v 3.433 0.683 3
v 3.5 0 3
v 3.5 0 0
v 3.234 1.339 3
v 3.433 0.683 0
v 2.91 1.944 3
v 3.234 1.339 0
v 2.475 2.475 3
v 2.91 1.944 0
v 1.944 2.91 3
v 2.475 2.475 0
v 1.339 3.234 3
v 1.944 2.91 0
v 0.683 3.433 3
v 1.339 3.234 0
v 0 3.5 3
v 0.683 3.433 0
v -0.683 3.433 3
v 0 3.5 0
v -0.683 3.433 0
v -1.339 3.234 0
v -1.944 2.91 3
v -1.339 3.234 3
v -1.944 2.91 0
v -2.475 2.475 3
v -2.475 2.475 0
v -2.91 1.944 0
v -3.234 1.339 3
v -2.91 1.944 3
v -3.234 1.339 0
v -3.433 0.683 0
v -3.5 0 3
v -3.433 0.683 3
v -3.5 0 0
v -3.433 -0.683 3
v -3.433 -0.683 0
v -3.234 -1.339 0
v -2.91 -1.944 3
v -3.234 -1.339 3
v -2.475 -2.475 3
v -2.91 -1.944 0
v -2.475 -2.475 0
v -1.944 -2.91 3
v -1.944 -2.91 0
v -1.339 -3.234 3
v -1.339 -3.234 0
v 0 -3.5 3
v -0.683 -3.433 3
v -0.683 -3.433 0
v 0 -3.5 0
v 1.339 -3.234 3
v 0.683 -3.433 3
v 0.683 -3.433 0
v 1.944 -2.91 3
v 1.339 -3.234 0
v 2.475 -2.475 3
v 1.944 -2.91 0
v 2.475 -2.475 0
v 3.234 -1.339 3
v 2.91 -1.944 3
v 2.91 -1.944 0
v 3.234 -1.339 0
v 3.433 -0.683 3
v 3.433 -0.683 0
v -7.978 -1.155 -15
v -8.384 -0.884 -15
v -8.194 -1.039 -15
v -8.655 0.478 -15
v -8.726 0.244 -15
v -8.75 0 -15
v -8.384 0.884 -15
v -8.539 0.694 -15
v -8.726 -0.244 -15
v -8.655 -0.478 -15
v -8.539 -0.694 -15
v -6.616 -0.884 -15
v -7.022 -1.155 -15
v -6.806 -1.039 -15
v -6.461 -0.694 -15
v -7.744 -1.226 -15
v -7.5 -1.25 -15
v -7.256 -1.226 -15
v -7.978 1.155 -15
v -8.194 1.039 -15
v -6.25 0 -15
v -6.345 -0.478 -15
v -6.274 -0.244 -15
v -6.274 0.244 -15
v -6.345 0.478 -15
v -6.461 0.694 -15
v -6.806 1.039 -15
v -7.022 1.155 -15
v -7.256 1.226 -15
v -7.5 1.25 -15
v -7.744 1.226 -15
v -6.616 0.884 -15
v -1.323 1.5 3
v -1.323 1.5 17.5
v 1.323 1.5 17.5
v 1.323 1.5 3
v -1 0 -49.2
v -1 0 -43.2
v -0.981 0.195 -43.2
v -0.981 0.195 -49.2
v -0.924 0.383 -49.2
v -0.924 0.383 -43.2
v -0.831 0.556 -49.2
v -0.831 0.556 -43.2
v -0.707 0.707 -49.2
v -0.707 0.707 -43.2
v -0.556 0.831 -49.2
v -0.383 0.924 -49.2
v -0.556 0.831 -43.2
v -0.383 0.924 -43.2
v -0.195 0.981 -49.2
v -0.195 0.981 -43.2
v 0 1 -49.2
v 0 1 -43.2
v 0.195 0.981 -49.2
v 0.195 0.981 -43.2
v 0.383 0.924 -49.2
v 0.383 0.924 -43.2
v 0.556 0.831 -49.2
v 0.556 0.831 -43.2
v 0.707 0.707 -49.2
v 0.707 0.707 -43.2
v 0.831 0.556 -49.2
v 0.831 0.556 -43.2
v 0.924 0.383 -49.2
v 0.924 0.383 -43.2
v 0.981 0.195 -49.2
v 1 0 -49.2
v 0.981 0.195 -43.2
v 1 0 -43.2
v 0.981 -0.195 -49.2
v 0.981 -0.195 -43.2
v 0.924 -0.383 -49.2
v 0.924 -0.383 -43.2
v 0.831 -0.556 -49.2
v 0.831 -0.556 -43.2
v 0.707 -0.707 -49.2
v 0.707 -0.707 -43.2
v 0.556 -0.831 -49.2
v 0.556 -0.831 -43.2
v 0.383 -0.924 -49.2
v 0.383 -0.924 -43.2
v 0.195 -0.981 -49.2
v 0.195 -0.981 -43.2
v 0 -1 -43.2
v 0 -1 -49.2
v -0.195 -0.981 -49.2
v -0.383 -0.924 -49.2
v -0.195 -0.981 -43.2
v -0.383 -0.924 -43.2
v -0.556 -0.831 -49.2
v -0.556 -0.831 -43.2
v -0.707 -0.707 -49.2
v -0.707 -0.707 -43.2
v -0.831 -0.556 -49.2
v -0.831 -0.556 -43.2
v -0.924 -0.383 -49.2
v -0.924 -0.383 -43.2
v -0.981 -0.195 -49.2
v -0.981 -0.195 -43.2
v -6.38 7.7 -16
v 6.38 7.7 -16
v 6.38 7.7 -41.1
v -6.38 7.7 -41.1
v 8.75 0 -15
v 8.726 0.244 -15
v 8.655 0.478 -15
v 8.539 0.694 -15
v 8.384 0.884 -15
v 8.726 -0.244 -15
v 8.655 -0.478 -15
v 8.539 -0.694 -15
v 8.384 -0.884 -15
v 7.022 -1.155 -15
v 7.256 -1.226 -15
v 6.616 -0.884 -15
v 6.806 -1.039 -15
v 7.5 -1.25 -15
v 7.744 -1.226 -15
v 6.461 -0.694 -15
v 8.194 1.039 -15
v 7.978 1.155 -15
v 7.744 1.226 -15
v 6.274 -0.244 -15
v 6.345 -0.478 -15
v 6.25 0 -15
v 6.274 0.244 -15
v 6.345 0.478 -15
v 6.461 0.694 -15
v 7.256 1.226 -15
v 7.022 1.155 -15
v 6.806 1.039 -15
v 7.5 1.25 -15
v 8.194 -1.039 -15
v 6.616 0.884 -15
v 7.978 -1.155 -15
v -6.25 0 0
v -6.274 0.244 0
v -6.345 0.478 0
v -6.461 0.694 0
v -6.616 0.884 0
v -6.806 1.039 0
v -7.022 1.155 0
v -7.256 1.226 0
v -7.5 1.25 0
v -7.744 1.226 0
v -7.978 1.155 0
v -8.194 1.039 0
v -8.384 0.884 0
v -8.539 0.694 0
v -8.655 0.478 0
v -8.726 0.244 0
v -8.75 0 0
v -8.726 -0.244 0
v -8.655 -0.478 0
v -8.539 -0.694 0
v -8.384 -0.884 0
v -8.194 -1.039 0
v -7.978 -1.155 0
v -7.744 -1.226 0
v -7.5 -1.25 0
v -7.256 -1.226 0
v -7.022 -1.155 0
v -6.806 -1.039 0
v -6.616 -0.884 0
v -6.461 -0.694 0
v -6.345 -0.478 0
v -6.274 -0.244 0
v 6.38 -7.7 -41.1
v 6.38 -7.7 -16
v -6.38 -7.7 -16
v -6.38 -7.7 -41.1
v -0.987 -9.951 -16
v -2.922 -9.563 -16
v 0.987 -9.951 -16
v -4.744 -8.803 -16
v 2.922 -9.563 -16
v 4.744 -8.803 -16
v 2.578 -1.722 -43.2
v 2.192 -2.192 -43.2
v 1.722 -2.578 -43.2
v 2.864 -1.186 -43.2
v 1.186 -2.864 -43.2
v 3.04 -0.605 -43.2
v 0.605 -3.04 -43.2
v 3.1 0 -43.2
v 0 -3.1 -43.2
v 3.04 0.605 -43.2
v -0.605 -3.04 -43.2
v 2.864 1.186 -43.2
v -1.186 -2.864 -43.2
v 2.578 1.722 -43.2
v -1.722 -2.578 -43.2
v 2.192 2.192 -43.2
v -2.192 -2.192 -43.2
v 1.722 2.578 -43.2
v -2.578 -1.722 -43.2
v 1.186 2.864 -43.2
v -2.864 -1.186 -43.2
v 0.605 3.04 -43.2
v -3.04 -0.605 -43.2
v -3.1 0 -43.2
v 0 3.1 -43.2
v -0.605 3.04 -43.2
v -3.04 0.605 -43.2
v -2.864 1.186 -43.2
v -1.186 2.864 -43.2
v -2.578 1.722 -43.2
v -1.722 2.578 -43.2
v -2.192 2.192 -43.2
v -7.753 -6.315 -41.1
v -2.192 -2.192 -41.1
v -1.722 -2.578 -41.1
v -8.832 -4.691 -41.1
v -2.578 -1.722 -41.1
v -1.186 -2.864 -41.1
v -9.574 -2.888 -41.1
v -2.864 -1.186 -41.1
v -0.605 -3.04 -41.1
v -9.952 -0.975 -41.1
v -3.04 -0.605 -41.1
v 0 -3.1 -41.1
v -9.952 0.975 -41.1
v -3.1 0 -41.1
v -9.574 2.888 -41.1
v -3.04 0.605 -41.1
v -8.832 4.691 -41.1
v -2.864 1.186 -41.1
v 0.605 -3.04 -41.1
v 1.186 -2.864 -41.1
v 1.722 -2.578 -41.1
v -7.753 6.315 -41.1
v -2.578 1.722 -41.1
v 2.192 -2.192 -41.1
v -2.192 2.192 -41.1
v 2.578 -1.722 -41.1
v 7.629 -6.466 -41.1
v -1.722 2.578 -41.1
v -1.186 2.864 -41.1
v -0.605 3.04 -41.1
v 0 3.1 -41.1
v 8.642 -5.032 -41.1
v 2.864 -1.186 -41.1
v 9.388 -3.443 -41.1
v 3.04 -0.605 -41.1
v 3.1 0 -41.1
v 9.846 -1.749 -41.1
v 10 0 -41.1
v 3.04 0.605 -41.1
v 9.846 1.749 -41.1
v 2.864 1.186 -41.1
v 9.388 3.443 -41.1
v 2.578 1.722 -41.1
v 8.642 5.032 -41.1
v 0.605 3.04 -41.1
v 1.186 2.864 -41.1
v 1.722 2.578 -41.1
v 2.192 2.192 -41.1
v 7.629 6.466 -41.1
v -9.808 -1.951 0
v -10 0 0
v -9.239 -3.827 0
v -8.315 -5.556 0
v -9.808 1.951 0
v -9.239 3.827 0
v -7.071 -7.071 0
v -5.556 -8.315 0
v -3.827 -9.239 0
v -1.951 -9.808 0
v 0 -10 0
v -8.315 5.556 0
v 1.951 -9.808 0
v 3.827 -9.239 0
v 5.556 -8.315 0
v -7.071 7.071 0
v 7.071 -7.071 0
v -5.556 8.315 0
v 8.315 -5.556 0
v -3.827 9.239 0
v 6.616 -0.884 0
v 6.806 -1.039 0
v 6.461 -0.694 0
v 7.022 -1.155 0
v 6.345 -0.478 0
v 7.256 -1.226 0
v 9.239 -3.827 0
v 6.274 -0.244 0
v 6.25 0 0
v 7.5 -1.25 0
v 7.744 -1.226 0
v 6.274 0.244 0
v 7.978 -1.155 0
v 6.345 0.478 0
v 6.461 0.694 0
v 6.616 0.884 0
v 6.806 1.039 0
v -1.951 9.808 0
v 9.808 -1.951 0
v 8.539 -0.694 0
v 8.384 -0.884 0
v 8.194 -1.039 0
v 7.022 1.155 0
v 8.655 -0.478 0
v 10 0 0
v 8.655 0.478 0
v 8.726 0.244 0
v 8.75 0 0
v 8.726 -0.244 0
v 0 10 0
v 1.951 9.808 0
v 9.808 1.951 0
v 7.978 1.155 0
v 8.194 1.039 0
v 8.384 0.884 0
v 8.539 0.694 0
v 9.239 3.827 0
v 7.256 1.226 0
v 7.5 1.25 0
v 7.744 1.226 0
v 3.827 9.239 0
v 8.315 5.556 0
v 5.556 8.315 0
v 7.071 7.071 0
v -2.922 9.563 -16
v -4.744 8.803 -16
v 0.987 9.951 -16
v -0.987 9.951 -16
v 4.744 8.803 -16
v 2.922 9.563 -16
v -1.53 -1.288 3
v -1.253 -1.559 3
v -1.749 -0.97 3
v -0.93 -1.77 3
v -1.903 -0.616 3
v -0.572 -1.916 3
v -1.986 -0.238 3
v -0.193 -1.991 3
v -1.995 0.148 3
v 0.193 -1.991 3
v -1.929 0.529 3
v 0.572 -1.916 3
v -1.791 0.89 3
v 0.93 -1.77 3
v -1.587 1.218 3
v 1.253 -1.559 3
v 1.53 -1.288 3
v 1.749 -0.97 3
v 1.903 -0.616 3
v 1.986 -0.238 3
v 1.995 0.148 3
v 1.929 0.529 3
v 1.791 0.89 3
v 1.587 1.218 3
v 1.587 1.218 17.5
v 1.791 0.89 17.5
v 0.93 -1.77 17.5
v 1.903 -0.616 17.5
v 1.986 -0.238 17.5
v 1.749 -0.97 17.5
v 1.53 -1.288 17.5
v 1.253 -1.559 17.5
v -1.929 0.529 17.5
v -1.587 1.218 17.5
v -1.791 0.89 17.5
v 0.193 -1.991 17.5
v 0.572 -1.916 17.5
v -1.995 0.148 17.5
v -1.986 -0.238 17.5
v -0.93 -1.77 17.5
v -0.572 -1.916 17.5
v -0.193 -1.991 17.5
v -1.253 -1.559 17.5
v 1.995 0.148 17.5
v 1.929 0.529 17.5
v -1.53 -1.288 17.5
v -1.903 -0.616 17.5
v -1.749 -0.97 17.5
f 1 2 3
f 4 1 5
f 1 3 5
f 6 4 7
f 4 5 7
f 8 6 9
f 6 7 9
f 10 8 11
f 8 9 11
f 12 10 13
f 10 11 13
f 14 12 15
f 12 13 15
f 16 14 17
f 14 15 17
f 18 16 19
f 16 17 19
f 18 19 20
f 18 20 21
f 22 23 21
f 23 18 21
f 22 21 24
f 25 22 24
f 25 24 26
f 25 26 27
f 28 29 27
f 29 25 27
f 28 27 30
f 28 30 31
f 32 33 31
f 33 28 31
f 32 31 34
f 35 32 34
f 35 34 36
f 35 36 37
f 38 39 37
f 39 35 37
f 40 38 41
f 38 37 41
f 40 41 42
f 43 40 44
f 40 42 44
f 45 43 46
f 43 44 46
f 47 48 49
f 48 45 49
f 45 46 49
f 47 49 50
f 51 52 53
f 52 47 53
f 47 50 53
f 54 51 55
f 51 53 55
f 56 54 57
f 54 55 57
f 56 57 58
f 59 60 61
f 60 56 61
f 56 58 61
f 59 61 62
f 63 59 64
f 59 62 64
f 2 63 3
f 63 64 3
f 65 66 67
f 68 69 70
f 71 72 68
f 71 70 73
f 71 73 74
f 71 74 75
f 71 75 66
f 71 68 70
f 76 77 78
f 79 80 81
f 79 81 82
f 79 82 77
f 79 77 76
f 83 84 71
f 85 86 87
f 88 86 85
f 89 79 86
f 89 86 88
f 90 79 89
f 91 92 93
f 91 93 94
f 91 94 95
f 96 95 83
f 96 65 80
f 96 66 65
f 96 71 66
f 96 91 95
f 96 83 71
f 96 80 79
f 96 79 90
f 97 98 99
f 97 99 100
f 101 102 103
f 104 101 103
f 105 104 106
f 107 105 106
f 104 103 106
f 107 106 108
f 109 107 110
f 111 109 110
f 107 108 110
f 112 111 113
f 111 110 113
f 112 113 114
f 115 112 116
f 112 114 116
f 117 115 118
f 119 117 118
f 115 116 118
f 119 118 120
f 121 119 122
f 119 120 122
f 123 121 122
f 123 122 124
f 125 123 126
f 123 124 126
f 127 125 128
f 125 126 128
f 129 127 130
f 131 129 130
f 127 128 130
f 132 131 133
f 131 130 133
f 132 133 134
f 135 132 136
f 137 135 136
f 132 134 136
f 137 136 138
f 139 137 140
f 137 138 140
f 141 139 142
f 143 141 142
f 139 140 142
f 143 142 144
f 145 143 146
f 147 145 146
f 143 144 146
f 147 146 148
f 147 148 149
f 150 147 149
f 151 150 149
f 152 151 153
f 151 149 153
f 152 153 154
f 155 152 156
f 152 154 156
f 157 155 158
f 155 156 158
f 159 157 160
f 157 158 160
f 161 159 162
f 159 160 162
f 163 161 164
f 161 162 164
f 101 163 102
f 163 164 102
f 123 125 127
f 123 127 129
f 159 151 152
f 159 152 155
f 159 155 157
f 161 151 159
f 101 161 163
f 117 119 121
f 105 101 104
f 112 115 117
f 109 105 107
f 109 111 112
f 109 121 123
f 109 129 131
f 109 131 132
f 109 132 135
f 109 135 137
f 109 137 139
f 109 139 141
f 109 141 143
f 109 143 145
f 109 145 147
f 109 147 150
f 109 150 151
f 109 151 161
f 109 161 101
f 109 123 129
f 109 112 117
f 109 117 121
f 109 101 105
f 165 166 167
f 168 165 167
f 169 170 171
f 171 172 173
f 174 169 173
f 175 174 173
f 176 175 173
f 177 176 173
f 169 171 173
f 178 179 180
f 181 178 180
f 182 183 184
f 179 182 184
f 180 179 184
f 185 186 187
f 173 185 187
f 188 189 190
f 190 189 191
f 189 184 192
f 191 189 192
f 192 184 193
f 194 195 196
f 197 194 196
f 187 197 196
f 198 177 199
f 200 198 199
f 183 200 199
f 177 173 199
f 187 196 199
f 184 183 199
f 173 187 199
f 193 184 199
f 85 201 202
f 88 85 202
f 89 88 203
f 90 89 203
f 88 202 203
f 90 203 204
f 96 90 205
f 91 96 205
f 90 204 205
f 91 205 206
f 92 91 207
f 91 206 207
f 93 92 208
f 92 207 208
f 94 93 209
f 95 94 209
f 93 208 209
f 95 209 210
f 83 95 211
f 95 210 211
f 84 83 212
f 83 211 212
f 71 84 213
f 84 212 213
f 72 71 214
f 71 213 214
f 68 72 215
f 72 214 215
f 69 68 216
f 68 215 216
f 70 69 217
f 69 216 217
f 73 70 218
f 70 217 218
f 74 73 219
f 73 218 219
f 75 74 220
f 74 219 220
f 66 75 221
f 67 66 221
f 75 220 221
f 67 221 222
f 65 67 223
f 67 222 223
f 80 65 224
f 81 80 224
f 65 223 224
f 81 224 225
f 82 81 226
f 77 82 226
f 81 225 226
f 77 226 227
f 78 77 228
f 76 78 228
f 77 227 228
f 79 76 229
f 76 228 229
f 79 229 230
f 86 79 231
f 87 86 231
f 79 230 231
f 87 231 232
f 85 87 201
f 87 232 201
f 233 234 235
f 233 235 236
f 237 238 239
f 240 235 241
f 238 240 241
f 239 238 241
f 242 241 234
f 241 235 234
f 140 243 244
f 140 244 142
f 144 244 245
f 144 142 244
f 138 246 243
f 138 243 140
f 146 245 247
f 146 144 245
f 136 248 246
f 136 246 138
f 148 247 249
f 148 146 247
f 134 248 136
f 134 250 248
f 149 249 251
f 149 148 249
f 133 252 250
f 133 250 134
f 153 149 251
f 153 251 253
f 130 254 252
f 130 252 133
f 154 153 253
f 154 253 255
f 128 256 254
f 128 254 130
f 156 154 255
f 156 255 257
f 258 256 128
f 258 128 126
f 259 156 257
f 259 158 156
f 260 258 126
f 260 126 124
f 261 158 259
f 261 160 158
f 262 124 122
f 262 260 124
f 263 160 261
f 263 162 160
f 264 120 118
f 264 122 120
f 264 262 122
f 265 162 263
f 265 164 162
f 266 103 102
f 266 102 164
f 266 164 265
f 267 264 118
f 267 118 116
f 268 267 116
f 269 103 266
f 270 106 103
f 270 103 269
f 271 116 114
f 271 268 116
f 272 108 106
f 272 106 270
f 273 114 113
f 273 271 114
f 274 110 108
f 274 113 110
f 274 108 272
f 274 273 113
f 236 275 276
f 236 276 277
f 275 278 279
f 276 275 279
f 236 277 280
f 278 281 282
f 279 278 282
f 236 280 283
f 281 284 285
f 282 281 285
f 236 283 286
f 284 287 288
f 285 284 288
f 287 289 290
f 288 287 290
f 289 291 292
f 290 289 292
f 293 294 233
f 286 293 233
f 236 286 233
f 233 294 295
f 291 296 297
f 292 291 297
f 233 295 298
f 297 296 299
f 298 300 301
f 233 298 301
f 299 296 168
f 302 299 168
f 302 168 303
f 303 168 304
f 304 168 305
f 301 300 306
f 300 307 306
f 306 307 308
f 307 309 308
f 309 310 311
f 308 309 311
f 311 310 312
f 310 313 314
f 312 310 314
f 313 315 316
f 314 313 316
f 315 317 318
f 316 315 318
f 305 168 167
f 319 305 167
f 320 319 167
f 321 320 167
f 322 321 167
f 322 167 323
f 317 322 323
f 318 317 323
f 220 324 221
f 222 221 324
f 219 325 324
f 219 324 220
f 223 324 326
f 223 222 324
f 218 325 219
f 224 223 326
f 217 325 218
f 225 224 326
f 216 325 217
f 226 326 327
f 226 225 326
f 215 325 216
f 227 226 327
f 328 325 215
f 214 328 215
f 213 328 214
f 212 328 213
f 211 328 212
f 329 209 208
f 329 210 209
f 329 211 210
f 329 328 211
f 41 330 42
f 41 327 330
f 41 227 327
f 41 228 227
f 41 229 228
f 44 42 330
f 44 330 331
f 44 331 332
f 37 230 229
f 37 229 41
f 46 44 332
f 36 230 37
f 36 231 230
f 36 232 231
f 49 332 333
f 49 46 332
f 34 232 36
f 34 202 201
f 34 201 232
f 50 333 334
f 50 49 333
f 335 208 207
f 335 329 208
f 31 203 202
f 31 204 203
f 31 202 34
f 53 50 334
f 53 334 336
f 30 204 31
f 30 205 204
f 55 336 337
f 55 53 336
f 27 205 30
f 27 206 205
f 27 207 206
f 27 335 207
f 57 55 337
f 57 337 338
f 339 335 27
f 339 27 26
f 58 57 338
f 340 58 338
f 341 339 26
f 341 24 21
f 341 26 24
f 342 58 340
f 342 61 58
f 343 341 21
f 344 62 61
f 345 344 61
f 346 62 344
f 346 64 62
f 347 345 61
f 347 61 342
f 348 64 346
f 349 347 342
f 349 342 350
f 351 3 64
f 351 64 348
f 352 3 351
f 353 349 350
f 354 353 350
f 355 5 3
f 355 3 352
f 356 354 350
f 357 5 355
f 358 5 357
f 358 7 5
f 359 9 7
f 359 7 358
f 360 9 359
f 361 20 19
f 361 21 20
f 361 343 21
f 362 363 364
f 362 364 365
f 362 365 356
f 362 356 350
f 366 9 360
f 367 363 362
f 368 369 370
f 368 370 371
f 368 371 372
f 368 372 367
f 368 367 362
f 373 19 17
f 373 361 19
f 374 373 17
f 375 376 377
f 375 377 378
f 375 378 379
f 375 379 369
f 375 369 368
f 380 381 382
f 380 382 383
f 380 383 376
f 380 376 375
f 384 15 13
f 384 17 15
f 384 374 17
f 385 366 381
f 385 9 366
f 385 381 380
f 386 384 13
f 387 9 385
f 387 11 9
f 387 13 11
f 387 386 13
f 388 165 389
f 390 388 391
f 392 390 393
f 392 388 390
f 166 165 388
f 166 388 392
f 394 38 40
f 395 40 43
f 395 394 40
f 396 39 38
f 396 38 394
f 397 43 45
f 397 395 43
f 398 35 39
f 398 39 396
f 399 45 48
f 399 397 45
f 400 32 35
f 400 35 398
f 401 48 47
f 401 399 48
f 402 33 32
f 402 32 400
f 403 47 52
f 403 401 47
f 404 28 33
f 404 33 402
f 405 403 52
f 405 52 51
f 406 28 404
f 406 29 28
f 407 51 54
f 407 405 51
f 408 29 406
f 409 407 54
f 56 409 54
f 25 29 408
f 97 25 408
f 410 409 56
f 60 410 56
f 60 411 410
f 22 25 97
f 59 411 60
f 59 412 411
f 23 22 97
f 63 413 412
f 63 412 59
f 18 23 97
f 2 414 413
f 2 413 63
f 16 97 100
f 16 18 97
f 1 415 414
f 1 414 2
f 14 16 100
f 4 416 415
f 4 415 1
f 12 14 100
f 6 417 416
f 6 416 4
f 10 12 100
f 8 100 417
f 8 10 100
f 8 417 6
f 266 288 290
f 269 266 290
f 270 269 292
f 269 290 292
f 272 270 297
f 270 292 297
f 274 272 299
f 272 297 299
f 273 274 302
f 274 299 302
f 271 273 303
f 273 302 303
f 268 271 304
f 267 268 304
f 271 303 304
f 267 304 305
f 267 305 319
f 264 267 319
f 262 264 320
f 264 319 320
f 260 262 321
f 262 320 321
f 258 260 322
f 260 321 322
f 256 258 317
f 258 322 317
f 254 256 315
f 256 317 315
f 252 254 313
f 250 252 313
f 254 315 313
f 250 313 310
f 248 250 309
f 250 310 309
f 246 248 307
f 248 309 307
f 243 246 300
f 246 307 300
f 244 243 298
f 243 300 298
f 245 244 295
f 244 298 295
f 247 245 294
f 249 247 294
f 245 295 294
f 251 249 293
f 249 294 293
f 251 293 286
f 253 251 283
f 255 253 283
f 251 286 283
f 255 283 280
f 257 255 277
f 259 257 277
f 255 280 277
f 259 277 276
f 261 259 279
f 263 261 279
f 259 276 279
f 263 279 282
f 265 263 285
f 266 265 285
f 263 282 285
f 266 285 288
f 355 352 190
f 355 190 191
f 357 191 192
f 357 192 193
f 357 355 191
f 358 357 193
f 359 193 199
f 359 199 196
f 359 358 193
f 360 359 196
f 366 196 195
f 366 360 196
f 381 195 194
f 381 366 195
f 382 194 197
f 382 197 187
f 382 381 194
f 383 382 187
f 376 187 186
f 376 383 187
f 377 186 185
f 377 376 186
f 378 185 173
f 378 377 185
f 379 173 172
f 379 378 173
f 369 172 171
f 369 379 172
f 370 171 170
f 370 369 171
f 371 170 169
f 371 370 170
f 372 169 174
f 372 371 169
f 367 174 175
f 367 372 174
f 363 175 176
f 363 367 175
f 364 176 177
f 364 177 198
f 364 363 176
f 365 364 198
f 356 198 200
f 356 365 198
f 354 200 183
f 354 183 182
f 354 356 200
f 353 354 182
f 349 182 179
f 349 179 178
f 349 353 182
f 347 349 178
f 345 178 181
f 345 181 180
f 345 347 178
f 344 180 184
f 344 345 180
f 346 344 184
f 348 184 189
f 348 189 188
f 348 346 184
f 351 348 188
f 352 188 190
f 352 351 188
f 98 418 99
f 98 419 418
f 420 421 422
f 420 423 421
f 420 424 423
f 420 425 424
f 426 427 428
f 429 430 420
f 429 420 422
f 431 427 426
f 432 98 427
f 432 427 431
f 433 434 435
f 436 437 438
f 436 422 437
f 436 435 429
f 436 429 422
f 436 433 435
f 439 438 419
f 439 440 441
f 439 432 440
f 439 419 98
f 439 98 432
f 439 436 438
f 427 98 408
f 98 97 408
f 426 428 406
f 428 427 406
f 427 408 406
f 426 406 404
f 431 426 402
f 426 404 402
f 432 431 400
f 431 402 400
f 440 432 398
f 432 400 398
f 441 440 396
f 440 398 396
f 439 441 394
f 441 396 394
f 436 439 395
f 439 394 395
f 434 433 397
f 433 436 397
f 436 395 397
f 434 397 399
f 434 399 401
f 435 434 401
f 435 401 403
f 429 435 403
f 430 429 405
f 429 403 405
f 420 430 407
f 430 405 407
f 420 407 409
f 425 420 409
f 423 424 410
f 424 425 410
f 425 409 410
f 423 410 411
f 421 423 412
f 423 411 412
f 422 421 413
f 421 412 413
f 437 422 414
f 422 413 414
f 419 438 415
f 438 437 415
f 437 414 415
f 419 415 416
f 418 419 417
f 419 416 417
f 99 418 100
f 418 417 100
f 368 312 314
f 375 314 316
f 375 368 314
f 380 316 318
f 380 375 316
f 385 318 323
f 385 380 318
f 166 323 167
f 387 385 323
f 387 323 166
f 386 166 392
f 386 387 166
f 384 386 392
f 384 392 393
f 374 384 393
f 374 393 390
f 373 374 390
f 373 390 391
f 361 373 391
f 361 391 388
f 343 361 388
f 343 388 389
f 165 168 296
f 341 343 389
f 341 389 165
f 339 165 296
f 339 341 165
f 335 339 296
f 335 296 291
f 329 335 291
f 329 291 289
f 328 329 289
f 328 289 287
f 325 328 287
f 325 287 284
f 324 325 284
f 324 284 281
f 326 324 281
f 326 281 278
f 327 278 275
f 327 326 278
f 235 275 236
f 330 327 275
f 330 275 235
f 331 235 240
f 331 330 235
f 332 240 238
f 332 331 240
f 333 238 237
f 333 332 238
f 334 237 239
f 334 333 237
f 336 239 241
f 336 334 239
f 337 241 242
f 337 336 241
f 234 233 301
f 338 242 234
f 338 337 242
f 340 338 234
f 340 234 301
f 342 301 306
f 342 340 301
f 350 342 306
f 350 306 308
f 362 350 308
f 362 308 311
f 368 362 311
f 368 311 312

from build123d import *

# Parameters (mm, degrees)
SKETCH1_R               = 10
BOSS_EXTRUDE1_DEPTH     = 41.1
SKETCH2_W               = 25.1
SKETCH2_H               = 2.3
CUT_EXTRUDE1_DEPTH      = 44.465043426
SKETCH3_R               = 3.5
BOSS_EXTRUDE2_DEPTH     = 3
SKETCH5_R               = 2
BOSS_EXTRUDE4_DEPTH     = 14.5
CUT_EXTRUDE2_DEPTH      = 44.465043426
CUT_EXTRUDE2_DEPTH_BACK = 44.465043426
SKETCH6_W               = 14.5
SKETCH6_H               = 0.5
SKETCH7_R               = 3.1
BOSS_EXTRUDE5_DEPTH     = 2.1
SKETCH8_R               = 1
BOSS_EXTRUDE6_DEPTH     = 6
SKETCH10_R              = 1.25
CUT_EXTRUDE3_DEPTH      = 15


with BuildPart() as part:
    # Sketch1 → Boss-Extrude1 (new body)
    with BuildSketch(Plane.XY):
        Circle(SKETCH1_R)
    extrude(amount=-BOSS_EXTRUDE1_DEPTH)

    # Sketch2 → Cut-Extrude1 (cut, symmetric)
    with BuildSketch(Plane(origin=(0, 0, 0), x_dir=(0, 0, -1), z_dir=(1, 0, 0))):
        with Locations((28.55, 8.85)):
            Rectangle(SKETCH2_W, SKETCH2_H)
    cut_extrude1 = extrude(amount=CUT_EXTRUDE1_DEPTH, both=True, mode=Mode.SUBTRACT)

    # Mirror1: Cut-Extrude1 across plane
    add(cut_extrude1.mirror(Plane.ZX), mode=Mode.SUBTRACT)

    # Sketch3 → Boss-Extrude2 (add)
    with BuildSketch(Plane.XY):
        Circle(SKETCH3_R)
    extrude(amount=BOSS_EXTRUDE2_DEPTH)

    # Sketch5 → Boss-Extrude4 (add)
    with BuildSketch(Plane.XY.offset(3)):
        with Locations(Location((0, 0, 0), (0, 0, 180))):
            Circle(SKETCH5_R)
    extrude(amount=BOSS_EXTRUDE4_DEPTH)

    # Sketch6 → Cut-Extrude2 (cut, two sides: drawn at the far end of the back side and taken through both)
    with BuildSketch(Plane(origin=(0, 0, 0), x_dir=(0, 0, -1), z_dir=(1, 0, 0)).offset(-CUT_EXTRUDE2_DEPTH_BACK)):
        with Locations((-10.25, 1.75)):
            Rectangle(SKETCH6_W, SKETCH6_H)
    extrude(amount=CUT_EXTRUDE2_DEPTH + CUT_EXTRUDE2_DEPTH_BACK, mode=Mode.SUBTRACT)

    # Sketch7 → Boss-Extrude5 (add)
    with BuildSketch(Plane(origin=(0, 0, -41.1), x_dir=(-1, 0, 0), z_dir=(0, 0, -1))):
        Circle(SKETCH7_R)
    extrude(amount=BOSS_EXTRUDE5_DEPTH)

    # Sketch8 → Boss-Extrude6 (add)
    with BuildSketch(Plane(origin=(0, 0, -43.2), x_dir=(-1, 0, 0), z_dir=(0, 0, -1))):
        Circle(SKETCH8_R)
    extrude(amount=BOSS_EXTRUDE6_DEPTH)

    # Sketch10 → Cut-Extrude3 (cut)
    with BuildSketch(Plane.XY):
        with Locations((-7.5, 0)):
            Circle(SKETCH10_R)
    cut_extrude3 = extrude(amount=-CUT_EXTRUDE3_DEPTH, mode=Mode.SUBTRACT)

    # Mirror2: Cut-Extrude3 across plane
    add(cut_extrude3.mirror(Plane(origin=(0, 0, 0), x_dir=(0, 0, 1), z_dir=(1, 0, 0))), mode=Mode.SUBTRACT)


solid = part.part
